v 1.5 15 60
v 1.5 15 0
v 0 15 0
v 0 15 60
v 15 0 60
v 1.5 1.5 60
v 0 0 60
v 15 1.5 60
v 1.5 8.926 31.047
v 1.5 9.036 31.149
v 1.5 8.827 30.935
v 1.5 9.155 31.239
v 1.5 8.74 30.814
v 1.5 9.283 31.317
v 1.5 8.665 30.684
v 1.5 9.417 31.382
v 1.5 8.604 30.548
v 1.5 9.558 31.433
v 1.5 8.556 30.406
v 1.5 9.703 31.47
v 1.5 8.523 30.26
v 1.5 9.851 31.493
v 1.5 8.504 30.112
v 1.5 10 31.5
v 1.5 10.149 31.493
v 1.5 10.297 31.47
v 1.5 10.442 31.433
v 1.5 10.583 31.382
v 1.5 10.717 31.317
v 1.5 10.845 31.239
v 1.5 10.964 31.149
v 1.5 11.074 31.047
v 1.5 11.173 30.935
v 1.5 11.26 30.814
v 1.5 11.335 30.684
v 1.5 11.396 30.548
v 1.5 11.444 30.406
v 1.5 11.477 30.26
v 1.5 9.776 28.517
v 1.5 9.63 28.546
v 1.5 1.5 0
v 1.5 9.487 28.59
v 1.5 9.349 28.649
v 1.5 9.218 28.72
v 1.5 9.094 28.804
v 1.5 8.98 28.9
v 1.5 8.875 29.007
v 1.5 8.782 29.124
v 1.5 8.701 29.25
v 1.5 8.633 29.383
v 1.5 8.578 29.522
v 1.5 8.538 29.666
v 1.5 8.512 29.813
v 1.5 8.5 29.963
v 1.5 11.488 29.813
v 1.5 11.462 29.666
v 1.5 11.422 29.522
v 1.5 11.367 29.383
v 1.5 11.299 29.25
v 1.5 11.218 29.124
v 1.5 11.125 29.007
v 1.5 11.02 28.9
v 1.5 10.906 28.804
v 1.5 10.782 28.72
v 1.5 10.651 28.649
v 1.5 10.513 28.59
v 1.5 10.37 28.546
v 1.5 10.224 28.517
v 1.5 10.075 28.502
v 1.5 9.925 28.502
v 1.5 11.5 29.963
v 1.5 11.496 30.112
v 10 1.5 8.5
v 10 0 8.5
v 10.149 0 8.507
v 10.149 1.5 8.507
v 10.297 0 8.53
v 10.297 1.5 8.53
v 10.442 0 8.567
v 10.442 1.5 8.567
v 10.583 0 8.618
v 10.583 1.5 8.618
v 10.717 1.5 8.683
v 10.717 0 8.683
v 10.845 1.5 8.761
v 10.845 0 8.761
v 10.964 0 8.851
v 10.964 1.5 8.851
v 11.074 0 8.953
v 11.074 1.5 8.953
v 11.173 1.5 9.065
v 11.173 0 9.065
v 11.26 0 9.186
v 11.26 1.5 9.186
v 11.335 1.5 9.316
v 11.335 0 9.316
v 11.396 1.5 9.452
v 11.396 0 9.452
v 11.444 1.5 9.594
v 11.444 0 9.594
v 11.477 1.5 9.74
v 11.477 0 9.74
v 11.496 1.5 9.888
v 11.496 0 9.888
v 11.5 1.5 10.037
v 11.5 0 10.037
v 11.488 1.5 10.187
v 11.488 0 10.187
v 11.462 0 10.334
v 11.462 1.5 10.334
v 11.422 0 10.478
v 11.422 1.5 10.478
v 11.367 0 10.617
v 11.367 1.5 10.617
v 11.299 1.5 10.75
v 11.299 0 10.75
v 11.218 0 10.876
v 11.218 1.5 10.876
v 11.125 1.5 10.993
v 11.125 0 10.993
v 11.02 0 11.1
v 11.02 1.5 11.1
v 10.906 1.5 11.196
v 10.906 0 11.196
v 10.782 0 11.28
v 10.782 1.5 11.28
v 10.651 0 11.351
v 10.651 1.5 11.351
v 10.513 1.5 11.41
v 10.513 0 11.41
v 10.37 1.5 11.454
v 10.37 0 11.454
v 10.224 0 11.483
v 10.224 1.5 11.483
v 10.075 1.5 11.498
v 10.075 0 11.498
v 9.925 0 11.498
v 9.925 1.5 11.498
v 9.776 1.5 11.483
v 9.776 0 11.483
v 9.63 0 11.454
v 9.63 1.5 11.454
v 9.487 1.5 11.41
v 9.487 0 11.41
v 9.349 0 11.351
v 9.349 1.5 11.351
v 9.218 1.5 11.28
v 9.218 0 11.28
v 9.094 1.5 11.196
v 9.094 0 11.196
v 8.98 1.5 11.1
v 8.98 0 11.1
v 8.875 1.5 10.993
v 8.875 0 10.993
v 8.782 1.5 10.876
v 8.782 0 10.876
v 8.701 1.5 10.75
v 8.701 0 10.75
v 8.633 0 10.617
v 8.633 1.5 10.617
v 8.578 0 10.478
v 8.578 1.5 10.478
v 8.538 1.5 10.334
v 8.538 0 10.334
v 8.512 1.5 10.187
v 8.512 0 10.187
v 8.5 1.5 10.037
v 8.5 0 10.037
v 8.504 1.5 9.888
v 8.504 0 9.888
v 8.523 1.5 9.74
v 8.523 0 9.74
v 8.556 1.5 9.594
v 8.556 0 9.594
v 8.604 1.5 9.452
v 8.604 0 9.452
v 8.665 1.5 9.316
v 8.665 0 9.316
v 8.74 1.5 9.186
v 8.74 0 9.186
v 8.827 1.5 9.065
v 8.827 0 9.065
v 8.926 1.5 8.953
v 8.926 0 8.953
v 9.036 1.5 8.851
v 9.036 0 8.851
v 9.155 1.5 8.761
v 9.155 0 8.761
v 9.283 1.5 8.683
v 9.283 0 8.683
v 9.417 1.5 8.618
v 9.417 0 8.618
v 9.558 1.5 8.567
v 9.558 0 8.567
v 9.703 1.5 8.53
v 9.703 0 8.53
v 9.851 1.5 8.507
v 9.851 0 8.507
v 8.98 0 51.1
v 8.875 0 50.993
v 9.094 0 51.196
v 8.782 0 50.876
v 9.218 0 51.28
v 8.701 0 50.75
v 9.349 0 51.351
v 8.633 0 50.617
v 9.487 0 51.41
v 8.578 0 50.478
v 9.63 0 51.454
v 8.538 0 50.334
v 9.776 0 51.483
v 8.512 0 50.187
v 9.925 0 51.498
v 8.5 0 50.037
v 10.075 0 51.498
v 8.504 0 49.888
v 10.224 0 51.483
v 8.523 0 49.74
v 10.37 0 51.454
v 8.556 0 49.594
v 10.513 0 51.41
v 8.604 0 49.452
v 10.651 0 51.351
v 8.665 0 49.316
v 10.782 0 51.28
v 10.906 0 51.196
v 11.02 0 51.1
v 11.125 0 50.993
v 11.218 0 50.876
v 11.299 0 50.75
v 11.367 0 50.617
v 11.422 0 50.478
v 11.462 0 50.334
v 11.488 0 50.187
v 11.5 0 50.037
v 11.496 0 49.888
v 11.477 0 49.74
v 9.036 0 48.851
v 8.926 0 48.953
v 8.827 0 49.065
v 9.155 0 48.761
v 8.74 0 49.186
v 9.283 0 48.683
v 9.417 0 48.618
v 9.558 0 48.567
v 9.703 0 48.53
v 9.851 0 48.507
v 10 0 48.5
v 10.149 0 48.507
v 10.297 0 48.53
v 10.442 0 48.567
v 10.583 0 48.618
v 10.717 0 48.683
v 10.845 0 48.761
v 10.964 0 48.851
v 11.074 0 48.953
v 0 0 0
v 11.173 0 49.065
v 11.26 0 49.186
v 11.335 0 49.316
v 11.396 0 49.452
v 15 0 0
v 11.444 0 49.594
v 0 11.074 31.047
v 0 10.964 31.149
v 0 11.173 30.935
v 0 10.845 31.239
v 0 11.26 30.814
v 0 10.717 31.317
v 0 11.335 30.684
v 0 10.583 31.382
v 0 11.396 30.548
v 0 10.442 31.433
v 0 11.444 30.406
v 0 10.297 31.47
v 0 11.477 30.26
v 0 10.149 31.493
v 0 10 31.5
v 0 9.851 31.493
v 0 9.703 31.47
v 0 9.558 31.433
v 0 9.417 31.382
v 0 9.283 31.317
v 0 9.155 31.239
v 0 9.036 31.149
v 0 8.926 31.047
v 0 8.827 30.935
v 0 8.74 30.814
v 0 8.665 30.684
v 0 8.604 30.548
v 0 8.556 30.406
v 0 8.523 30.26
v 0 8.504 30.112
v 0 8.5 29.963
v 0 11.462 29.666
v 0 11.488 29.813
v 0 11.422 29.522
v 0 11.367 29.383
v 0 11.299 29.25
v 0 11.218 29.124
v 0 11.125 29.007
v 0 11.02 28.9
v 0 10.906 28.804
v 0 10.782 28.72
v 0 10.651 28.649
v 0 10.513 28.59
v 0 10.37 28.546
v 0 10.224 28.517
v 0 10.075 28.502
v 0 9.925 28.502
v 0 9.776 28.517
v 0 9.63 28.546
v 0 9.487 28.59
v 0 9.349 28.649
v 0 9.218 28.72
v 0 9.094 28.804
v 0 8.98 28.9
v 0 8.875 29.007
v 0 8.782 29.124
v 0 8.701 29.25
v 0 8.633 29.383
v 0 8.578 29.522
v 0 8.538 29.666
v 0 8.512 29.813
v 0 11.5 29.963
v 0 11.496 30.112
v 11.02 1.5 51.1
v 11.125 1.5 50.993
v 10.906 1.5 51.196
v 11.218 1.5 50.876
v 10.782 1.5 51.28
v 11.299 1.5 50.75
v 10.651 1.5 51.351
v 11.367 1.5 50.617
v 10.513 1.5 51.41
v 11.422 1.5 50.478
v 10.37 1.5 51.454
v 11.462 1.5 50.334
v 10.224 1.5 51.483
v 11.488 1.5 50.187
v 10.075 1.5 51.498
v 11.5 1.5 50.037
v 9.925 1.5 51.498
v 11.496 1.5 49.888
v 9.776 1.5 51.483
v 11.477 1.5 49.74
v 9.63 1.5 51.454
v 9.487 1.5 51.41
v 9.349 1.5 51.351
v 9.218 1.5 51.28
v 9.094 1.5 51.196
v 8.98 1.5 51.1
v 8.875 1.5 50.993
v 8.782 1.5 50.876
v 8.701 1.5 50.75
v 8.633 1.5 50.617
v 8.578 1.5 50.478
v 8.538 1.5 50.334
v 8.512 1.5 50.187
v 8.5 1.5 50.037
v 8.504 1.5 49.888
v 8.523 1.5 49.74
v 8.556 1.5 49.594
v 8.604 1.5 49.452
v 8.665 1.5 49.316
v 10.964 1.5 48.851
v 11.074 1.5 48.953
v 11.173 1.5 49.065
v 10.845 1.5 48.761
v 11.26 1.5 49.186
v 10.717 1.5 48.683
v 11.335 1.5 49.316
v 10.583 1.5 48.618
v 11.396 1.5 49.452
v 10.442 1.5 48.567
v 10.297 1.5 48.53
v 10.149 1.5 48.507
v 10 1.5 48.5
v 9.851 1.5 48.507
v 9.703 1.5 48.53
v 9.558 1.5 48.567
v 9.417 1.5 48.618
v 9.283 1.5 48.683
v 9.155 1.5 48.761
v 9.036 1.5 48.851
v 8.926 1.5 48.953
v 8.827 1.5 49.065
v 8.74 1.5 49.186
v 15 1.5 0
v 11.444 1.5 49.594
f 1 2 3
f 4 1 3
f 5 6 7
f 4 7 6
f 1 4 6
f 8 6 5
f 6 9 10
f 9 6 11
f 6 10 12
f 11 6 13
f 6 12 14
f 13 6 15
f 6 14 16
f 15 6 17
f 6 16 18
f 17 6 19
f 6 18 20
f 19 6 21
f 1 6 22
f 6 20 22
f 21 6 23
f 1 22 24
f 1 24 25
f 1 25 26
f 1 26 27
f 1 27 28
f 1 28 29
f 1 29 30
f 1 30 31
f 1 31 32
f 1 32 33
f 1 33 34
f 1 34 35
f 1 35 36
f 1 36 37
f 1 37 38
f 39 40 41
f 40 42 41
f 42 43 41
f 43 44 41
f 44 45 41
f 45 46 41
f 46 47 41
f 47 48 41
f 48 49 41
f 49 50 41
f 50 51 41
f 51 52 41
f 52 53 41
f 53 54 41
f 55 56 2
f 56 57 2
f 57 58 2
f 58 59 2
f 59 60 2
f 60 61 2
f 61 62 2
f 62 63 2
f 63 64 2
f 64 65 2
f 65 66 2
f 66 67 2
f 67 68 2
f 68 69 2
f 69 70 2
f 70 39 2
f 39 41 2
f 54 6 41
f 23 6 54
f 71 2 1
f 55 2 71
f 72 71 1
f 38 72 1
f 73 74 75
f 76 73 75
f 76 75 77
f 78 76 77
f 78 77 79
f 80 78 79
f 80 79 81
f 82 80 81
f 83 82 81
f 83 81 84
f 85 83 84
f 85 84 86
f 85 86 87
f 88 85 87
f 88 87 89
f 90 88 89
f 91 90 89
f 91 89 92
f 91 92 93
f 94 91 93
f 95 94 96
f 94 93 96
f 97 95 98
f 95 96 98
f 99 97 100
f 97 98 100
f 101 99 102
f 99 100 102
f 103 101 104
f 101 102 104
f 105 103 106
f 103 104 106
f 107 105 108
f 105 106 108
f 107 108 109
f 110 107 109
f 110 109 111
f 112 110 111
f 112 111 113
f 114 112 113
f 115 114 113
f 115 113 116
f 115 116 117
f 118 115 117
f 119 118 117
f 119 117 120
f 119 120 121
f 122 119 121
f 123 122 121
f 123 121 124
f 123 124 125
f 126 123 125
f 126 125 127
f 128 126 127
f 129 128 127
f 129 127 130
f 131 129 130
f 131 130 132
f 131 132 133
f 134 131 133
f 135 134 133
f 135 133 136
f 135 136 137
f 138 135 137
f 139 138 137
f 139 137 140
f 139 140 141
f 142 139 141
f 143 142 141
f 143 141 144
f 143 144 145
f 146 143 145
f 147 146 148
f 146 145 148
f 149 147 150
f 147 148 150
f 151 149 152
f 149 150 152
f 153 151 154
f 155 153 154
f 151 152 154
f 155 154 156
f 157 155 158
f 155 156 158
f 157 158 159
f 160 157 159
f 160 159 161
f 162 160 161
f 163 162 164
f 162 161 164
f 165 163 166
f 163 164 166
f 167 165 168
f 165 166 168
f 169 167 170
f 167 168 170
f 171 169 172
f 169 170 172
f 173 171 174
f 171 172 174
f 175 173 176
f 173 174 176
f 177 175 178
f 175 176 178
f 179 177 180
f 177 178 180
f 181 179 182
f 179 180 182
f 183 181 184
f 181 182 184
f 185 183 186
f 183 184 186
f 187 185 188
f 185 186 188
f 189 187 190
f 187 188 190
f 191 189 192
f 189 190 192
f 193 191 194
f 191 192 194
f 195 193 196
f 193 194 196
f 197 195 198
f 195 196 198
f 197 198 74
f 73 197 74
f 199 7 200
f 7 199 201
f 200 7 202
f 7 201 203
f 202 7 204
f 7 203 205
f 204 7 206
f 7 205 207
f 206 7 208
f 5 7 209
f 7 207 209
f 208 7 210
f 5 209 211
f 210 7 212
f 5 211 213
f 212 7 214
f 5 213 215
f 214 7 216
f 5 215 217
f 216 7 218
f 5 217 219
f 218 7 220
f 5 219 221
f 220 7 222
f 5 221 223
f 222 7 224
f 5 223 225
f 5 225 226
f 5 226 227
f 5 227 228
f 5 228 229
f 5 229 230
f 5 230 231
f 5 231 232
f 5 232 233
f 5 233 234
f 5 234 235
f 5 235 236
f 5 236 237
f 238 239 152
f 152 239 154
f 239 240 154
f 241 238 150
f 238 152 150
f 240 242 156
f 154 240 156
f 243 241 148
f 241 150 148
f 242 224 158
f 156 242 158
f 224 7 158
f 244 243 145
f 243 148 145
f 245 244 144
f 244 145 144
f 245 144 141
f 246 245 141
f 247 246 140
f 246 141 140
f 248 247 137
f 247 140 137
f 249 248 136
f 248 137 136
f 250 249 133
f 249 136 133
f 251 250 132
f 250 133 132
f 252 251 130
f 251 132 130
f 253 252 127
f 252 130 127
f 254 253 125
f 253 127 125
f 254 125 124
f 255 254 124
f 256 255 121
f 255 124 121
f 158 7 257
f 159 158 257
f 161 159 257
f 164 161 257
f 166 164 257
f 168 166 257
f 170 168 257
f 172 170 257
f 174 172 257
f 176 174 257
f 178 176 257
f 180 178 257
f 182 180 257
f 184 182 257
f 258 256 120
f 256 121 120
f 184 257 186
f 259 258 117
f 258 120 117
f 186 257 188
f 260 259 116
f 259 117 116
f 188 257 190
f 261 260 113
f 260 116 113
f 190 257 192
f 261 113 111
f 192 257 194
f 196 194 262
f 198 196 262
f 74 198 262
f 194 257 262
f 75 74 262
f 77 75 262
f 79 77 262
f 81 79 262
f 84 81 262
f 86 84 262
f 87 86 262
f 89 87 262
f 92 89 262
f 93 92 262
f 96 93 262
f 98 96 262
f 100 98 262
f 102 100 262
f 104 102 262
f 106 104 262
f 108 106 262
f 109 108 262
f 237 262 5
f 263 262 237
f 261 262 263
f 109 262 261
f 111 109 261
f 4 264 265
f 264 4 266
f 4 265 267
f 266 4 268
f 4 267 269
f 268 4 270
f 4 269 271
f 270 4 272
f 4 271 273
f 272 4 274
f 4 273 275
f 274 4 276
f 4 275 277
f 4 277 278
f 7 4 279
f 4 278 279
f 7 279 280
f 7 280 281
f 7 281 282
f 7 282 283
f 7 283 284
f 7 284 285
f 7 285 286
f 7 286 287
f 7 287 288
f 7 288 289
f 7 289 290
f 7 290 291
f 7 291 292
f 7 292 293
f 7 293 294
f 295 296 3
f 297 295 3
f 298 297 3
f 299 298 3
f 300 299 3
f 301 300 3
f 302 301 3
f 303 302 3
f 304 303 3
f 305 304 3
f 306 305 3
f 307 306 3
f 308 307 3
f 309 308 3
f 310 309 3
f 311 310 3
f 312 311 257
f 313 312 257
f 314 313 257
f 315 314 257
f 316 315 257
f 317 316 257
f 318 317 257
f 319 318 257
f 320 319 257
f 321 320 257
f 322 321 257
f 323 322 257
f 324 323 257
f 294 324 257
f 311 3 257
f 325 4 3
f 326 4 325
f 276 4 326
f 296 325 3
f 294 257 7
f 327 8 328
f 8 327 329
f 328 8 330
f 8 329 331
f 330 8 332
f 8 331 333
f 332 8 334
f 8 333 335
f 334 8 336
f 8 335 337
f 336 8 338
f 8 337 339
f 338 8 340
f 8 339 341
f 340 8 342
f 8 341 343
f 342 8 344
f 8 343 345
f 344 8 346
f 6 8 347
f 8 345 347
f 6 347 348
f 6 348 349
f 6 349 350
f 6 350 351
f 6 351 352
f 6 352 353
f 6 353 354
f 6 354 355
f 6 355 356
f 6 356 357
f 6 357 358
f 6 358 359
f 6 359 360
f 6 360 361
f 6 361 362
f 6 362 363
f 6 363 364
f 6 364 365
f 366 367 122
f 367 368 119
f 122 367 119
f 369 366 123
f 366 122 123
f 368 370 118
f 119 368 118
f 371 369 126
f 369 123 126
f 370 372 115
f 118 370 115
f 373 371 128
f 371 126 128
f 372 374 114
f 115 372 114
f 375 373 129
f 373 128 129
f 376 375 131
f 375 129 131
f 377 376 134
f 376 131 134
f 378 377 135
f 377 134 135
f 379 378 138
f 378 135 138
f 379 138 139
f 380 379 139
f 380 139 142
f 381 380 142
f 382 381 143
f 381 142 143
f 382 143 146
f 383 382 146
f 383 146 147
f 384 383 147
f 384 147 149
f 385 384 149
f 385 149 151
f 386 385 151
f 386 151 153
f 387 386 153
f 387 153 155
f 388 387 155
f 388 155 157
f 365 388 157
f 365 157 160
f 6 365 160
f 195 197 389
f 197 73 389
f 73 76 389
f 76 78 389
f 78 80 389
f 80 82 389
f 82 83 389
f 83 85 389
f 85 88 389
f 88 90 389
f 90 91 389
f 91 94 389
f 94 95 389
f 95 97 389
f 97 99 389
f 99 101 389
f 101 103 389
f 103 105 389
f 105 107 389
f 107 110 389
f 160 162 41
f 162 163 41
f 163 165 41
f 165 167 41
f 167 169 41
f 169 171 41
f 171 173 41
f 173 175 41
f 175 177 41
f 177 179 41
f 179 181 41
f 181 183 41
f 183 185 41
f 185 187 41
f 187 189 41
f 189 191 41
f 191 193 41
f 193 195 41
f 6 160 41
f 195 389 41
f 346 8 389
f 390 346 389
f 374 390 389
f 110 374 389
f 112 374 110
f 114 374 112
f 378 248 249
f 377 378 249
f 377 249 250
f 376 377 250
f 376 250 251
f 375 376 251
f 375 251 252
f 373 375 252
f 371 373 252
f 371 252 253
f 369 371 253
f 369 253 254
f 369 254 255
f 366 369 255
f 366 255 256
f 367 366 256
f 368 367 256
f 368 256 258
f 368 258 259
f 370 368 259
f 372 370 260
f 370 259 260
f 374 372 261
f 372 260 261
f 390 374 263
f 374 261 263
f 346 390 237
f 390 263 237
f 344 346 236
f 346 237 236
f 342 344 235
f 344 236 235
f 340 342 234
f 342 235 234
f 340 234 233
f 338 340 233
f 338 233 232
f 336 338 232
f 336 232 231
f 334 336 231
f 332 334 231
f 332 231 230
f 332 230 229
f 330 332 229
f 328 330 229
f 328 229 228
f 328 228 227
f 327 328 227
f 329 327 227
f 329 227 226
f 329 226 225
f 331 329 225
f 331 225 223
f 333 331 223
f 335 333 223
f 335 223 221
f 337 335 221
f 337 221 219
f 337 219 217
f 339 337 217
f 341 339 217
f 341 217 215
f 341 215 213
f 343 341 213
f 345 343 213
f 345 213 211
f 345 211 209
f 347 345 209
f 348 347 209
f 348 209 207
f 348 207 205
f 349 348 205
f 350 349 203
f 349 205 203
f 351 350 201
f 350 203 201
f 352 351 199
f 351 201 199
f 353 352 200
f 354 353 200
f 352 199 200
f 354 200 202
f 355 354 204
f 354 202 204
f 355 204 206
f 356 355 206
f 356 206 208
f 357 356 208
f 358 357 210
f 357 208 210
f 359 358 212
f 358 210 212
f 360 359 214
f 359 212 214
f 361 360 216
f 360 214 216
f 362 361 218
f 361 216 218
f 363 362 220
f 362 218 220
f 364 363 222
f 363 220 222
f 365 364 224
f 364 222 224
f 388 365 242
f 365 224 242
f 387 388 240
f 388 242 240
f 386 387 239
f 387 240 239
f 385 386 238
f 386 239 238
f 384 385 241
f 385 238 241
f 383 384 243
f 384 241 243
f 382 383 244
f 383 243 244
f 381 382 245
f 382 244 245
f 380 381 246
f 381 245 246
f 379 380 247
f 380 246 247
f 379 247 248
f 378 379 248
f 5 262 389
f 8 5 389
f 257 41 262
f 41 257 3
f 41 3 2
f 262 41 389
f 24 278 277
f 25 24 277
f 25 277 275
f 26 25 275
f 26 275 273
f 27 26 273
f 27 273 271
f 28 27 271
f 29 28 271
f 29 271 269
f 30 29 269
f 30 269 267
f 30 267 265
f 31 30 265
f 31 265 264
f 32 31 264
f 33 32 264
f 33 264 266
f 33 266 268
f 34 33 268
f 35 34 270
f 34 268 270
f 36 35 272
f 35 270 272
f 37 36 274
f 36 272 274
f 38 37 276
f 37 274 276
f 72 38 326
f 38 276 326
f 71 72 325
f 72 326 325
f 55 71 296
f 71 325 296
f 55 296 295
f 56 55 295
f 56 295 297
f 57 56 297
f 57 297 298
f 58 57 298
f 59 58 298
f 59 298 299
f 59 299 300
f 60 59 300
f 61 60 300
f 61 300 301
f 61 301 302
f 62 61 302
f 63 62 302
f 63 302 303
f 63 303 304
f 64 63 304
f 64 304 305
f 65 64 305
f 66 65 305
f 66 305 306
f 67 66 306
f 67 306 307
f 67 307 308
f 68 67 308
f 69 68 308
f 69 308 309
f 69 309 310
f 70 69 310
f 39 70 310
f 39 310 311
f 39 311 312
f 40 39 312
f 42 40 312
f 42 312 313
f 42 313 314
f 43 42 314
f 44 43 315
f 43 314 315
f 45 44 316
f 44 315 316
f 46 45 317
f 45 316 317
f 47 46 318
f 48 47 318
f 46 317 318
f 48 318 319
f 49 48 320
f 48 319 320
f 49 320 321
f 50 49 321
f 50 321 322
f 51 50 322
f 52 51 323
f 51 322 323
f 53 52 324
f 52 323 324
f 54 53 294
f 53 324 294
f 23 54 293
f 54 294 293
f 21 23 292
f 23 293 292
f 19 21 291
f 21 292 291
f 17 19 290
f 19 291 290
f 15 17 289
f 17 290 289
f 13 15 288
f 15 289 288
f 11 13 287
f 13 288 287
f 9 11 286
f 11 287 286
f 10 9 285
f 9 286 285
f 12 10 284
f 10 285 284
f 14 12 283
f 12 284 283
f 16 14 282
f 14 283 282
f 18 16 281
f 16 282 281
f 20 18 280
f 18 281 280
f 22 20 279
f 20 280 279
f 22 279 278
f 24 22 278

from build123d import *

# Parameters (mm, degrees)
EXTRUSION1_DEPTH           = 60
ESQUISSE2_R                = 1.5
EXTRUSION2_DEPTH           = 60
ESQUISSE3_R                = 1.5
EXTRUSION3_DEPTH           = 60
R_P_TITION_LIN_AIRE1_COUNT = 2
R_P_TITION_LIN_AIRE1_PITCH = 40


with BuildPart() as part:
    # Esquisse1 → Extrusion1 (new body)
    with BuildSketch(Plane.XY):
        Polygon((0, 0), (1.5, 0), (15, 0), (15, 1.5), (1.5, 1.5), (1.5, 15), (0, 15), align=None)
    extrude(amount=EXTRUSION1_DEPTH)

    # Esquisse2 → Extrusion2 (cut)
    with BuildSketch(Plane.ZY):
        with Locations((30, 10)):
            Circle(ESQUISSE2_R)
    extrude(amount=-EXTRUSION2_DEPTH, mode=Mode.SUBTRACT)

    # Esquisse3 → Extrusion3 (cut)
    with BuildSketch(Plane.XZ):
        with Locations(Location((10, 10, 0), (0, 0, 270))):
            Circle(ESQUISSE3_R)
    extrusion3 = extrude(amount=-EXTRUSION3_DEPTH, mode=Mode.SUBTRACT)

    # Répétition linéaire1: Extrusion3 ×2
    with Locations(*[(0, 0, i * R_P_TITION_LIN_AIRE1_PITCH) for i in range(1, R_P_TITION_LIN_AIRE1_COUNT)]):
        add(extrusion3, mode=Mode.SUBTRACT)


solid = part.part
